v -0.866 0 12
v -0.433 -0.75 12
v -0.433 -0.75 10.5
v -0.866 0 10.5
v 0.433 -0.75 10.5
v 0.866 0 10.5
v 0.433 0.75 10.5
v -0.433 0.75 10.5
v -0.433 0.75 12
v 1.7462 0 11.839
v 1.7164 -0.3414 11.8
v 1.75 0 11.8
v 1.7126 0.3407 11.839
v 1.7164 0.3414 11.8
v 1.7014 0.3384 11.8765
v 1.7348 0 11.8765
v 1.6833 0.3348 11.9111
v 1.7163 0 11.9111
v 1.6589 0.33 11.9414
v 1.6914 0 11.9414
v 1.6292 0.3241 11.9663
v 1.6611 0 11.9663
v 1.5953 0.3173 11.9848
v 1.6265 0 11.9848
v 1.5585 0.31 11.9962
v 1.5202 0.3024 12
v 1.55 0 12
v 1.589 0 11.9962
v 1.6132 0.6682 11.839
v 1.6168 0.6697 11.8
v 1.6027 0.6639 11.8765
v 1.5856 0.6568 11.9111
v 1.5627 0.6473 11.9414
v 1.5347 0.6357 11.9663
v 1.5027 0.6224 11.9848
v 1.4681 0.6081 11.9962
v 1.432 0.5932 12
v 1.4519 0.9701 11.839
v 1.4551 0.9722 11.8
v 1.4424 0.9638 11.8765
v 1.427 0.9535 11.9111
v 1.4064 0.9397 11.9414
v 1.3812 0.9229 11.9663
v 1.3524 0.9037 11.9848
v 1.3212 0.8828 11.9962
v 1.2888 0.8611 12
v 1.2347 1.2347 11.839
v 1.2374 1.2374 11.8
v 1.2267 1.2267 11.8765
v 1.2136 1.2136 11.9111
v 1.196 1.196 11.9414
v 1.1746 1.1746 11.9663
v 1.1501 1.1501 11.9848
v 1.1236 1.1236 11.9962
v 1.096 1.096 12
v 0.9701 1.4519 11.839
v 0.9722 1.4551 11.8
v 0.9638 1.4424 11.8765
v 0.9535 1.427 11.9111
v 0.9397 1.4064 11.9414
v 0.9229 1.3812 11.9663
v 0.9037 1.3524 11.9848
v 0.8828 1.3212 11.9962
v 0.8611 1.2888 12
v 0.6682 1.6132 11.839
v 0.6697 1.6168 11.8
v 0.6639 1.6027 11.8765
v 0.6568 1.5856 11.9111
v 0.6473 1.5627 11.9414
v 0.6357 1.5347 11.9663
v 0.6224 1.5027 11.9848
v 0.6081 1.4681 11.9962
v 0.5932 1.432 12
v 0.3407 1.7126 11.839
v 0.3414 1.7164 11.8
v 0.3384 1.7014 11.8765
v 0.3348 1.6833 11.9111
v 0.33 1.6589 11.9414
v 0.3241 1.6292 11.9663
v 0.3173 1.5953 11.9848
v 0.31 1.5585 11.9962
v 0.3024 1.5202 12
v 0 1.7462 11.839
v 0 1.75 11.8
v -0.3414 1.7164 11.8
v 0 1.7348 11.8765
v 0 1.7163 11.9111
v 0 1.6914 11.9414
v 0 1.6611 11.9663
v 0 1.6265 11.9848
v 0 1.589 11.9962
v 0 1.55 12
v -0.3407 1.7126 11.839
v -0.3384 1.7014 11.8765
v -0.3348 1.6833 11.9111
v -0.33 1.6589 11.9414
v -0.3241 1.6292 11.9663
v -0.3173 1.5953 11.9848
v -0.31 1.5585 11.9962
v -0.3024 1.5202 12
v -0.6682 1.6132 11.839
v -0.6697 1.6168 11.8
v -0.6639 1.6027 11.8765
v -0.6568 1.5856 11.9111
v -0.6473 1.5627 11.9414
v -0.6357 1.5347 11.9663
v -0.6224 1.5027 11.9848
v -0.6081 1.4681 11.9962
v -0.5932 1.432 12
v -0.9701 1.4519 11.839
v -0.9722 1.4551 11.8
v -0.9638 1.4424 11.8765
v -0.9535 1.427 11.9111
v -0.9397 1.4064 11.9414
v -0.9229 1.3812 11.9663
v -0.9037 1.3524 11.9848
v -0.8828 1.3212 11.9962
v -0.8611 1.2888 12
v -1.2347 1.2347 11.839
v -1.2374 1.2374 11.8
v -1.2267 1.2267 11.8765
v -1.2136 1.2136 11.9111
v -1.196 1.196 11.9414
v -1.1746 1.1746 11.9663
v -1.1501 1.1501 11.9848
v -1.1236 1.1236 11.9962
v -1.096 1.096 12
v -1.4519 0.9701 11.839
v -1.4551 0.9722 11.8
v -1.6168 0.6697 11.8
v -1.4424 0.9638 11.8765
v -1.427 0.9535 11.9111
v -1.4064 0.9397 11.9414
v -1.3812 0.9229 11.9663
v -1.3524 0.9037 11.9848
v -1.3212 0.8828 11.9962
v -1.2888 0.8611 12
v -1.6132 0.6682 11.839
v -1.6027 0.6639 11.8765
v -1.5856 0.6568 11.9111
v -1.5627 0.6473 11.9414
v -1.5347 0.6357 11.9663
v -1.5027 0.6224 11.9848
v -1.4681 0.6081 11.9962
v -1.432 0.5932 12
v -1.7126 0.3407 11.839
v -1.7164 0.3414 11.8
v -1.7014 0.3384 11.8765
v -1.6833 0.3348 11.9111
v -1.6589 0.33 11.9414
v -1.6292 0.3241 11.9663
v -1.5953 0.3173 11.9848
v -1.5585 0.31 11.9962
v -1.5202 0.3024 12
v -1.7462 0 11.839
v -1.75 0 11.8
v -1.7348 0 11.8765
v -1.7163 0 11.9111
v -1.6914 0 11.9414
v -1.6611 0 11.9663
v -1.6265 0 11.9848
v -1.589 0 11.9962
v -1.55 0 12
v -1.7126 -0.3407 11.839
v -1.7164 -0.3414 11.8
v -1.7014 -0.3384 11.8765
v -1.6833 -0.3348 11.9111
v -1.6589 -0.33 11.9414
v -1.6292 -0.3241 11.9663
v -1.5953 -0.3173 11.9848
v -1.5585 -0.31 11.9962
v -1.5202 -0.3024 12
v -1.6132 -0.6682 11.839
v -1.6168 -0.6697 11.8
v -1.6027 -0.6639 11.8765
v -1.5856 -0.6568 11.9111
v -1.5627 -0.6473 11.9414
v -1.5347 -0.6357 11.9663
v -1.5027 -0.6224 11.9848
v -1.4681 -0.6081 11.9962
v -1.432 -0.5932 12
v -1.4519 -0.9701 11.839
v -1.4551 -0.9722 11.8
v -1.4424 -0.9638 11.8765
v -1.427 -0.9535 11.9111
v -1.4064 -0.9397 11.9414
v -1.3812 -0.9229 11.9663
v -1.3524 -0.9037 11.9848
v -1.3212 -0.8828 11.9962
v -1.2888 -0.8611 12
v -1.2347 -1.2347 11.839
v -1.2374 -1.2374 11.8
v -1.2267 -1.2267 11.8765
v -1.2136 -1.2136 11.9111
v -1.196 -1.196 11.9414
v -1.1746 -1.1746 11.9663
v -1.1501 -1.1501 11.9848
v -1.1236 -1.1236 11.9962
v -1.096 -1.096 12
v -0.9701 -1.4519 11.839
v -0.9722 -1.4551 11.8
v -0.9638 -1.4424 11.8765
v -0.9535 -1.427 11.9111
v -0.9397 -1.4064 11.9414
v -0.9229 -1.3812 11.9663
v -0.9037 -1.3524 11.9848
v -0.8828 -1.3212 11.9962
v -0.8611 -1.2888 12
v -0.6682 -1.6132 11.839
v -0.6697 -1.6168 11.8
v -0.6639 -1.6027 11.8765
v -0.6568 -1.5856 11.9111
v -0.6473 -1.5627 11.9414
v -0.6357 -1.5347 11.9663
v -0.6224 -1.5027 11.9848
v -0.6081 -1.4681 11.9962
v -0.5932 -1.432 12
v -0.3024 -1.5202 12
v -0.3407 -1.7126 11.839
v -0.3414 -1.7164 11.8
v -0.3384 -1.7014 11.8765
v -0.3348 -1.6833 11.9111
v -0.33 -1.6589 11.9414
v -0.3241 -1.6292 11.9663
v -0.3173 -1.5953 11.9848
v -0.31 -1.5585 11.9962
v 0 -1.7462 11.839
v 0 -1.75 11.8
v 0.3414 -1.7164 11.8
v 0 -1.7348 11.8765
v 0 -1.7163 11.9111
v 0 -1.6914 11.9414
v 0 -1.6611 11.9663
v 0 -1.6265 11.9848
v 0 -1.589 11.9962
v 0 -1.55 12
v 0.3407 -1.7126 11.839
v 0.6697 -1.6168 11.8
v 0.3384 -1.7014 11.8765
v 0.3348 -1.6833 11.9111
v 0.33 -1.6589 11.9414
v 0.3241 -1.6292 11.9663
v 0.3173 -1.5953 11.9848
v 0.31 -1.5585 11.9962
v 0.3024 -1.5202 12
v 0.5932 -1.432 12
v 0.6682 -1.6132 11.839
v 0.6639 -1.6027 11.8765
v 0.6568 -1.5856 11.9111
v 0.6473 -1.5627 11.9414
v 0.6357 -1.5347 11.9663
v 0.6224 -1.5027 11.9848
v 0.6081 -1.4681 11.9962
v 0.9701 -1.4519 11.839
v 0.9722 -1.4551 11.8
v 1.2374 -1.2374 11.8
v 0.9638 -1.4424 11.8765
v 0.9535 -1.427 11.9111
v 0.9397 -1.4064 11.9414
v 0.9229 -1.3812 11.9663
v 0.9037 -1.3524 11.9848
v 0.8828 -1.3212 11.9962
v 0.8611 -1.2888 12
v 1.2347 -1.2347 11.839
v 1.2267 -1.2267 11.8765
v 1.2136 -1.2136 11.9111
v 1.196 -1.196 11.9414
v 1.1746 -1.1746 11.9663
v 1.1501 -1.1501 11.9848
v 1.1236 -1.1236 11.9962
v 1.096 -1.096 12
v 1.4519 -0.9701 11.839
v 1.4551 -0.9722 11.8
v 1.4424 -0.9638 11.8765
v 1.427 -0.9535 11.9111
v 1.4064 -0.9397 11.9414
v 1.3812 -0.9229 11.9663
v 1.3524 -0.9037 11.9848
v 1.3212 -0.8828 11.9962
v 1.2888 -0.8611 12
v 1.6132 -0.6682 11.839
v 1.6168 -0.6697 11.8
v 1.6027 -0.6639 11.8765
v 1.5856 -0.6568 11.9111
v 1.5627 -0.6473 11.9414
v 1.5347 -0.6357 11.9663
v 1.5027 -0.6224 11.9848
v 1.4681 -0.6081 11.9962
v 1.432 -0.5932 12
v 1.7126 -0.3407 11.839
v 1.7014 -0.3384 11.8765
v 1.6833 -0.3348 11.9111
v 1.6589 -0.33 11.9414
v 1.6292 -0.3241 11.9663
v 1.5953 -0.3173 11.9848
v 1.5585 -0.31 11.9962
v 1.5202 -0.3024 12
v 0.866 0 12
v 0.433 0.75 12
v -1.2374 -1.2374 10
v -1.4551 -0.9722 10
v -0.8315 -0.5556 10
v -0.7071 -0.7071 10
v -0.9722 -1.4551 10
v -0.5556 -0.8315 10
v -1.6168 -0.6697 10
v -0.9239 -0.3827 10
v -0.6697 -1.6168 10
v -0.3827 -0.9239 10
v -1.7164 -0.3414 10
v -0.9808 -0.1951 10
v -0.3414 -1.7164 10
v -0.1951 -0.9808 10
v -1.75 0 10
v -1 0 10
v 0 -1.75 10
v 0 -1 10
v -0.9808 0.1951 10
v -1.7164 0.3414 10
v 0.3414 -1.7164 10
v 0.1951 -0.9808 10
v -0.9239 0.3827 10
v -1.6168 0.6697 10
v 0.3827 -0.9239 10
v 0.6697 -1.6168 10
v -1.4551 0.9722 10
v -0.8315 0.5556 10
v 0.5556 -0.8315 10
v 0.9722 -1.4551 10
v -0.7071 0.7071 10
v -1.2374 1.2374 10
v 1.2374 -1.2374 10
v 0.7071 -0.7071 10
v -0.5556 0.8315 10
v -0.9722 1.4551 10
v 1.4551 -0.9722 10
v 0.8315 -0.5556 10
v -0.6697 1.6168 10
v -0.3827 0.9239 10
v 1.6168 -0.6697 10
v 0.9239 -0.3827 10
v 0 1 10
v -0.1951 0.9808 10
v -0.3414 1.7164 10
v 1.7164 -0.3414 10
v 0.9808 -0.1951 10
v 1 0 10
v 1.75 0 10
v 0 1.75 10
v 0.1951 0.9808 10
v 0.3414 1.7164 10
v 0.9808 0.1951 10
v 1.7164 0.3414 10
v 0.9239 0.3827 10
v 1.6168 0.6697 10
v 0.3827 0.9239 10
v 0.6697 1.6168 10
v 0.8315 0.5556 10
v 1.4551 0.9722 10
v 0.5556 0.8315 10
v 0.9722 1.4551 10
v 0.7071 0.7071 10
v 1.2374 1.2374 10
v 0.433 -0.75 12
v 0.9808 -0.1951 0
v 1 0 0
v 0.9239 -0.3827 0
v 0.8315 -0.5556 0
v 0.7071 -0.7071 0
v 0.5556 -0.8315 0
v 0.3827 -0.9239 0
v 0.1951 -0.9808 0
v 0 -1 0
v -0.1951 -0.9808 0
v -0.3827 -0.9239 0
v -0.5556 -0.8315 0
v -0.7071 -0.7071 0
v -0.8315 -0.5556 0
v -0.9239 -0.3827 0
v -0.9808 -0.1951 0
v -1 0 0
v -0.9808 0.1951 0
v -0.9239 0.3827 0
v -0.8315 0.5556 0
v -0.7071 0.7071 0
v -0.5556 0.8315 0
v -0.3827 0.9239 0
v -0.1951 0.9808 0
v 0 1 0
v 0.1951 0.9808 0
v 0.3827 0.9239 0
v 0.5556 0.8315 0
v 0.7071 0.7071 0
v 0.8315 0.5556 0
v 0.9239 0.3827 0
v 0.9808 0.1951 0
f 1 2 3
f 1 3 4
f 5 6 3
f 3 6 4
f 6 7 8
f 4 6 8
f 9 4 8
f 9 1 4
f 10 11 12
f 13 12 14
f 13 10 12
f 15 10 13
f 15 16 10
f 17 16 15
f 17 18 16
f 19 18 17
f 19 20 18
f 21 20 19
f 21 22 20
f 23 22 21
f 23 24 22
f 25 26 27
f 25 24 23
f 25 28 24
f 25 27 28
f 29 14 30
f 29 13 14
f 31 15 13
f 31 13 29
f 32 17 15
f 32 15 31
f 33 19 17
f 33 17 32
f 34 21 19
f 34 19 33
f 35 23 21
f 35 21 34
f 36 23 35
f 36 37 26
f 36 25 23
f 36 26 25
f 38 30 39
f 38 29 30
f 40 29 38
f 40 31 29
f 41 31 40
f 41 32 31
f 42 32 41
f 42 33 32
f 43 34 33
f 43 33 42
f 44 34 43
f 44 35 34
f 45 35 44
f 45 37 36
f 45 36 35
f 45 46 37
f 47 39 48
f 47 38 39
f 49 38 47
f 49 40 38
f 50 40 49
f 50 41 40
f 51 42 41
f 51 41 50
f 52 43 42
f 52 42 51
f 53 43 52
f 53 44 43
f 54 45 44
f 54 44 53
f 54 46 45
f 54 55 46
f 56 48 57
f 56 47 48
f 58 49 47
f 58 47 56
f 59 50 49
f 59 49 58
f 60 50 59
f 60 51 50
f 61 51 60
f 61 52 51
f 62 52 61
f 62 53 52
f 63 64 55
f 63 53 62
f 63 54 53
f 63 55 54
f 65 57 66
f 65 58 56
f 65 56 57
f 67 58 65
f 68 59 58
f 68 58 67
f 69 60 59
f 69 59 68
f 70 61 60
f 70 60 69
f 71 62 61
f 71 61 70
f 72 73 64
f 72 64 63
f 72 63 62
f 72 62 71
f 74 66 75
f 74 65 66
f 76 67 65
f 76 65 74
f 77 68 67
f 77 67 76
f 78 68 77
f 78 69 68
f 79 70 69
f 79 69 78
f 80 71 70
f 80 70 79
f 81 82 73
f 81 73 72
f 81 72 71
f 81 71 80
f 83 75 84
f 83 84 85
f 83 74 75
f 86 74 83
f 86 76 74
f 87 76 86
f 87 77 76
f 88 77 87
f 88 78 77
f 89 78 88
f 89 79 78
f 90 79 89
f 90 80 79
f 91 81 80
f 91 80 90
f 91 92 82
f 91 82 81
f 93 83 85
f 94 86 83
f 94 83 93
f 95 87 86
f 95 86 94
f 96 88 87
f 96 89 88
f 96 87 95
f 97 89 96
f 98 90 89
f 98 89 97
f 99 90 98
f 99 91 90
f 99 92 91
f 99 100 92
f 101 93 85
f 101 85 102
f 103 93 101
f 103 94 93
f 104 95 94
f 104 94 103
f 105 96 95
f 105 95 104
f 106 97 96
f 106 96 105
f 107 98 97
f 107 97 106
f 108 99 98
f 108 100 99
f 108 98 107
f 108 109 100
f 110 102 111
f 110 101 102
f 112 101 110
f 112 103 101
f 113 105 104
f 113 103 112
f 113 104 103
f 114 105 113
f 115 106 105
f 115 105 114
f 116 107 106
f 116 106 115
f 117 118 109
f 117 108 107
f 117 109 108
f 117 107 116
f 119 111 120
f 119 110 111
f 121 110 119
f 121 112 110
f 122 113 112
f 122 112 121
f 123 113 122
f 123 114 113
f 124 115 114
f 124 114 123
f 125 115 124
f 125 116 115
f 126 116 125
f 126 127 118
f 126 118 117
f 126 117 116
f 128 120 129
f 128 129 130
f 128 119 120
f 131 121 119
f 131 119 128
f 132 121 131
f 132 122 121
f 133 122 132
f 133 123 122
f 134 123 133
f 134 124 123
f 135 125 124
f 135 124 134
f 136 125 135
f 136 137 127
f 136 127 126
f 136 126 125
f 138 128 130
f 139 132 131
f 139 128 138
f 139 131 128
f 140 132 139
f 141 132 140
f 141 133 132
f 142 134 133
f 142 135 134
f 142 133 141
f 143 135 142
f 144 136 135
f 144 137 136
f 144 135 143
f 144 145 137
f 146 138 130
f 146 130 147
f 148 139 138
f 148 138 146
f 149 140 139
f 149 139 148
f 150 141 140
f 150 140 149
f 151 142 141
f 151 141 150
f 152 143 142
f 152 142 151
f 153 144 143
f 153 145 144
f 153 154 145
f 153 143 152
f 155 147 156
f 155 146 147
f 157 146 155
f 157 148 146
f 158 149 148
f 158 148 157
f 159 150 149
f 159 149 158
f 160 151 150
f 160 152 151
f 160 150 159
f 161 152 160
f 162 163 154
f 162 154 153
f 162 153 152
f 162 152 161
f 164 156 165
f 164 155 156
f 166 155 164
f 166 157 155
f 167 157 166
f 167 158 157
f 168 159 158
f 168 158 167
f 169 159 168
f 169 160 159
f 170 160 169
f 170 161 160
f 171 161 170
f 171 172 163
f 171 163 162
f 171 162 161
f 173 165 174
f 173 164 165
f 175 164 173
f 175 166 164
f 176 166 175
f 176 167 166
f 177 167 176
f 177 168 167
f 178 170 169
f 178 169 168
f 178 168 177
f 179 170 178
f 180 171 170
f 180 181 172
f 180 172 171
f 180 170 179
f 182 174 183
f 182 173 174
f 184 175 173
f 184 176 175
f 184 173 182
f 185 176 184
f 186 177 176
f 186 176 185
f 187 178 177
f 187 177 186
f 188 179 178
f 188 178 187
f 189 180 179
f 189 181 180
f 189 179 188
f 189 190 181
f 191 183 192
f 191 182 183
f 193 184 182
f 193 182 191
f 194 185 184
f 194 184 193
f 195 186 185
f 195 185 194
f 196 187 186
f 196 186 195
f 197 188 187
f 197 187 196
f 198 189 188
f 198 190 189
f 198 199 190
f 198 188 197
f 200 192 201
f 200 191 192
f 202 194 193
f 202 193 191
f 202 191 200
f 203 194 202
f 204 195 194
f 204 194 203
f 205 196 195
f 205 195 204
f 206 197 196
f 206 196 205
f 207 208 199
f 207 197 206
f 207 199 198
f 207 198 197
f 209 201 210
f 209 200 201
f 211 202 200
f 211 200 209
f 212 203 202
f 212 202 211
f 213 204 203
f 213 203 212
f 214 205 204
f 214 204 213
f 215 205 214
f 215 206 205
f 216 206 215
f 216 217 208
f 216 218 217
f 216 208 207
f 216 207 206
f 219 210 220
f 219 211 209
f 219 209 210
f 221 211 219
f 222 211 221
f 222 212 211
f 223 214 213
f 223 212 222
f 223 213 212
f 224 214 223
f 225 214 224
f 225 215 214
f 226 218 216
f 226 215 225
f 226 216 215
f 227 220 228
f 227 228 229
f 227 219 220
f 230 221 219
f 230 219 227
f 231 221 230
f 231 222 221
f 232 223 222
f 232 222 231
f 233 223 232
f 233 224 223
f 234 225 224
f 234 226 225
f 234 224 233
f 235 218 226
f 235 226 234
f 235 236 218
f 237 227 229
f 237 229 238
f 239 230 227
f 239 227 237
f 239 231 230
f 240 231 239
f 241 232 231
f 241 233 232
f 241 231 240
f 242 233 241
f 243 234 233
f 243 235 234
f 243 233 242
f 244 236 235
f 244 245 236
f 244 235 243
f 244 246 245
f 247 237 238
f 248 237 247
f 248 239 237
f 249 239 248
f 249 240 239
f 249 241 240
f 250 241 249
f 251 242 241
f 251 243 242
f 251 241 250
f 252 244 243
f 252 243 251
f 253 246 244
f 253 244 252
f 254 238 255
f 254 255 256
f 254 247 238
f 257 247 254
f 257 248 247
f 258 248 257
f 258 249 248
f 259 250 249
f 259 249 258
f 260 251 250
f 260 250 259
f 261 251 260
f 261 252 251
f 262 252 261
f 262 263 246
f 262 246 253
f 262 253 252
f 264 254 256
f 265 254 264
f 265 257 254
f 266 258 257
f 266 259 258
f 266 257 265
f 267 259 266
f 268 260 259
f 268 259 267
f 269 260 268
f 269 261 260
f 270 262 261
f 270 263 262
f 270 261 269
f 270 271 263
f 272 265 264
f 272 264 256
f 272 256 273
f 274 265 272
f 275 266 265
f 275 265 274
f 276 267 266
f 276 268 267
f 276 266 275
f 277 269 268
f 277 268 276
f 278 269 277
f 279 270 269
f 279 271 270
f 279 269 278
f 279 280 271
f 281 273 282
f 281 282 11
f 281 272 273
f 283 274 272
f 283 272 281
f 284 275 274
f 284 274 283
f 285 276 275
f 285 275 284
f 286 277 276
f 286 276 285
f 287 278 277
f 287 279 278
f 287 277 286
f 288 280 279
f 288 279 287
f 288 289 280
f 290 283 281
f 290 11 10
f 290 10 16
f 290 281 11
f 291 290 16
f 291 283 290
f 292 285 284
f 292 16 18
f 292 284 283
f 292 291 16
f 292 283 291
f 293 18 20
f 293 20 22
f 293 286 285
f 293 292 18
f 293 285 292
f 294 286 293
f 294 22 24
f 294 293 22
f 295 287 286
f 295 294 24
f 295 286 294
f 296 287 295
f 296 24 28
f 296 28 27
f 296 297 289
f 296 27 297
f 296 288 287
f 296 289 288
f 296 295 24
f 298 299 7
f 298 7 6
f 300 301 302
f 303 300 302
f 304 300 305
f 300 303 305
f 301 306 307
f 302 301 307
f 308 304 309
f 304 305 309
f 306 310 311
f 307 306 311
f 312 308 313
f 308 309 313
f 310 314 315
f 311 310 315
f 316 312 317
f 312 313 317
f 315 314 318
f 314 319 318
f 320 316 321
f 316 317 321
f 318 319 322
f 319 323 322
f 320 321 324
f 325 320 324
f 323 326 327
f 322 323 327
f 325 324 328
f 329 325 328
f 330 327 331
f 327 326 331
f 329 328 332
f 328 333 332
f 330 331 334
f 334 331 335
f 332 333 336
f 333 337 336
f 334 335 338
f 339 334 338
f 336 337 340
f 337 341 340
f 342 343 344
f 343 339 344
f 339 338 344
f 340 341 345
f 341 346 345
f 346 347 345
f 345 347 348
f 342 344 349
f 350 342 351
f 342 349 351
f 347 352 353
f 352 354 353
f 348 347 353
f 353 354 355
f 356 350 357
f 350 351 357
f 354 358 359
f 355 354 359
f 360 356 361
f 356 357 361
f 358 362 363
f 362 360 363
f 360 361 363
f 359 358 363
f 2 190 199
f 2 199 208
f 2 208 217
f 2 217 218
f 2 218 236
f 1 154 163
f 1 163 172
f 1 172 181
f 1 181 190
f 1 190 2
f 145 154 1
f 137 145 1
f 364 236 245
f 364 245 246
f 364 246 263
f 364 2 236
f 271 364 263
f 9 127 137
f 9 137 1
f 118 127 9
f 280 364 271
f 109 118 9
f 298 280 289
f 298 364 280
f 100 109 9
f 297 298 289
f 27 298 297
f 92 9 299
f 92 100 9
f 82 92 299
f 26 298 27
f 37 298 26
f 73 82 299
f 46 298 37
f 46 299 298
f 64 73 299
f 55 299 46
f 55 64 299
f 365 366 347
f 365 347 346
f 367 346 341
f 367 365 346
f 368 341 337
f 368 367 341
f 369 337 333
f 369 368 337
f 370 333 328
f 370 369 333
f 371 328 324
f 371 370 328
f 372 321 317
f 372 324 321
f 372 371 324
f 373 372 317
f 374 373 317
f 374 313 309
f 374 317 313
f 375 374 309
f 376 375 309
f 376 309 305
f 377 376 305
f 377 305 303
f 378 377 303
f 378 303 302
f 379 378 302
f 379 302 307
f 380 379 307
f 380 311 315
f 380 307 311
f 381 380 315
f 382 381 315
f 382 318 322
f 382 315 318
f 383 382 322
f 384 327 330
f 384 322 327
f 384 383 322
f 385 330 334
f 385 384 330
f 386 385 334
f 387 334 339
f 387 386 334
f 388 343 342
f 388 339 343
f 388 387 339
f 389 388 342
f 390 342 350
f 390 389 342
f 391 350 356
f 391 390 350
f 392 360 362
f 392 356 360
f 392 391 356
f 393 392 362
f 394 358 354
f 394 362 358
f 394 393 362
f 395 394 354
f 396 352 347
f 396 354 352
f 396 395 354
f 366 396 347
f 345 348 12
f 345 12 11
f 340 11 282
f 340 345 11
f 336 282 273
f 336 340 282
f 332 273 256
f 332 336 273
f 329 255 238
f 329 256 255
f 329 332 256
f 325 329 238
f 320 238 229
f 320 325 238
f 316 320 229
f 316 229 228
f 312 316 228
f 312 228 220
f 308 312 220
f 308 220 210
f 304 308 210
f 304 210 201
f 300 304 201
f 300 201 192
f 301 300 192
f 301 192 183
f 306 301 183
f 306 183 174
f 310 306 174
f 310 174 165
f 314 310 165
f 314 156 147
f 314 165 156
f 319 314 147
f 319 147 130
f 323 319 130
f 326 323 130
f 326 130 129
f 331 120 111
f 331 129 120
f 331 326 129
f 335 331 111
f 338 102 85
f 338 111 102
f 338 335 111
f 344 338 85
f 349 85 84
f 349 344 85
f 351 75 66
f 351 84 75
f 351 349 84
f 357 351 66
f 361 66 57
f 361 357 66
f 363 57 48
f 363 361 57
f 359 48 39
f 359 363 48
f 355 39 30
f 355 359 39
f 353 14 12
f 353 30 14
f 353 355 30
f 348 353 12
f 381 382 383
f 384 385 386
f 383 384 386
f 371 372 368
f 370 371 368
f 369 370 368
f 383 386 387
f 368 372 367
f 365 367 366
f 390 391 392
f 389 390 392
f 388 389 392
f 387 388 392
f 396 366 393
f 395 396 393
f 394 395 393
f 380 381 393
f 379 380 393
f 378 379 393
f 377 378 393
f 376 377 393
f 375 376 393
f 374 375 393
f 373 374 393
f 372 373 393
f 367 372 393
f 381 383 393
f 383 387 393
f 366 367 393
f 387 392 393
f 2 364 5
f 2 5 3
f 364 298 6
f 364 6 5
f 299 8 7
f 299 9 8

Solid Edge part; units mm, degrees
sketch "Sketch1" plane through (0, 0, 0) normal (0, 0, 1) x (1, 0, 0)
  circle A0 centre (0, 0) radius 1
extrude "Protrusion1" add sketch "Sketch1" along normal blind 10
sketch "Sketch2" plane through (0, 0, 10) normal (0, 0, 1) x (1, 0, 0)
  circle A0 centre (0, 0) radius 1.75
extrude "ExtrudedProtrusion_2" add sketch "Sketch2" along normal blind 2
sketch "Sketch3" plane through (0, 0, 12) normal (0, 0, 1) x (1, 0, 0)
  line L0 (0.433, 0.75) -> (0.866, 0)
  line L1 (0.866, 0) -> (0.433, -0.75)
  line L2 (0.433, -0.75) -> (-0.433, -0.75)
  line L3 (-0.433, -0.75) -> (-0.866, 0)
  line L4 (-0.866, 0) -> (-0.433, 0.75)
  line L5 (-0.433, 0.75) -> (0.433, 0.75)
extrude "ExtrudedCutout_1" cut sketch "Sketch3" against normal blind 1.5
fillet "Round_1" radius 0.2 1 edges at (-1.75, 0, 12)
cosmetic_thread "Thread1" size "M2"
